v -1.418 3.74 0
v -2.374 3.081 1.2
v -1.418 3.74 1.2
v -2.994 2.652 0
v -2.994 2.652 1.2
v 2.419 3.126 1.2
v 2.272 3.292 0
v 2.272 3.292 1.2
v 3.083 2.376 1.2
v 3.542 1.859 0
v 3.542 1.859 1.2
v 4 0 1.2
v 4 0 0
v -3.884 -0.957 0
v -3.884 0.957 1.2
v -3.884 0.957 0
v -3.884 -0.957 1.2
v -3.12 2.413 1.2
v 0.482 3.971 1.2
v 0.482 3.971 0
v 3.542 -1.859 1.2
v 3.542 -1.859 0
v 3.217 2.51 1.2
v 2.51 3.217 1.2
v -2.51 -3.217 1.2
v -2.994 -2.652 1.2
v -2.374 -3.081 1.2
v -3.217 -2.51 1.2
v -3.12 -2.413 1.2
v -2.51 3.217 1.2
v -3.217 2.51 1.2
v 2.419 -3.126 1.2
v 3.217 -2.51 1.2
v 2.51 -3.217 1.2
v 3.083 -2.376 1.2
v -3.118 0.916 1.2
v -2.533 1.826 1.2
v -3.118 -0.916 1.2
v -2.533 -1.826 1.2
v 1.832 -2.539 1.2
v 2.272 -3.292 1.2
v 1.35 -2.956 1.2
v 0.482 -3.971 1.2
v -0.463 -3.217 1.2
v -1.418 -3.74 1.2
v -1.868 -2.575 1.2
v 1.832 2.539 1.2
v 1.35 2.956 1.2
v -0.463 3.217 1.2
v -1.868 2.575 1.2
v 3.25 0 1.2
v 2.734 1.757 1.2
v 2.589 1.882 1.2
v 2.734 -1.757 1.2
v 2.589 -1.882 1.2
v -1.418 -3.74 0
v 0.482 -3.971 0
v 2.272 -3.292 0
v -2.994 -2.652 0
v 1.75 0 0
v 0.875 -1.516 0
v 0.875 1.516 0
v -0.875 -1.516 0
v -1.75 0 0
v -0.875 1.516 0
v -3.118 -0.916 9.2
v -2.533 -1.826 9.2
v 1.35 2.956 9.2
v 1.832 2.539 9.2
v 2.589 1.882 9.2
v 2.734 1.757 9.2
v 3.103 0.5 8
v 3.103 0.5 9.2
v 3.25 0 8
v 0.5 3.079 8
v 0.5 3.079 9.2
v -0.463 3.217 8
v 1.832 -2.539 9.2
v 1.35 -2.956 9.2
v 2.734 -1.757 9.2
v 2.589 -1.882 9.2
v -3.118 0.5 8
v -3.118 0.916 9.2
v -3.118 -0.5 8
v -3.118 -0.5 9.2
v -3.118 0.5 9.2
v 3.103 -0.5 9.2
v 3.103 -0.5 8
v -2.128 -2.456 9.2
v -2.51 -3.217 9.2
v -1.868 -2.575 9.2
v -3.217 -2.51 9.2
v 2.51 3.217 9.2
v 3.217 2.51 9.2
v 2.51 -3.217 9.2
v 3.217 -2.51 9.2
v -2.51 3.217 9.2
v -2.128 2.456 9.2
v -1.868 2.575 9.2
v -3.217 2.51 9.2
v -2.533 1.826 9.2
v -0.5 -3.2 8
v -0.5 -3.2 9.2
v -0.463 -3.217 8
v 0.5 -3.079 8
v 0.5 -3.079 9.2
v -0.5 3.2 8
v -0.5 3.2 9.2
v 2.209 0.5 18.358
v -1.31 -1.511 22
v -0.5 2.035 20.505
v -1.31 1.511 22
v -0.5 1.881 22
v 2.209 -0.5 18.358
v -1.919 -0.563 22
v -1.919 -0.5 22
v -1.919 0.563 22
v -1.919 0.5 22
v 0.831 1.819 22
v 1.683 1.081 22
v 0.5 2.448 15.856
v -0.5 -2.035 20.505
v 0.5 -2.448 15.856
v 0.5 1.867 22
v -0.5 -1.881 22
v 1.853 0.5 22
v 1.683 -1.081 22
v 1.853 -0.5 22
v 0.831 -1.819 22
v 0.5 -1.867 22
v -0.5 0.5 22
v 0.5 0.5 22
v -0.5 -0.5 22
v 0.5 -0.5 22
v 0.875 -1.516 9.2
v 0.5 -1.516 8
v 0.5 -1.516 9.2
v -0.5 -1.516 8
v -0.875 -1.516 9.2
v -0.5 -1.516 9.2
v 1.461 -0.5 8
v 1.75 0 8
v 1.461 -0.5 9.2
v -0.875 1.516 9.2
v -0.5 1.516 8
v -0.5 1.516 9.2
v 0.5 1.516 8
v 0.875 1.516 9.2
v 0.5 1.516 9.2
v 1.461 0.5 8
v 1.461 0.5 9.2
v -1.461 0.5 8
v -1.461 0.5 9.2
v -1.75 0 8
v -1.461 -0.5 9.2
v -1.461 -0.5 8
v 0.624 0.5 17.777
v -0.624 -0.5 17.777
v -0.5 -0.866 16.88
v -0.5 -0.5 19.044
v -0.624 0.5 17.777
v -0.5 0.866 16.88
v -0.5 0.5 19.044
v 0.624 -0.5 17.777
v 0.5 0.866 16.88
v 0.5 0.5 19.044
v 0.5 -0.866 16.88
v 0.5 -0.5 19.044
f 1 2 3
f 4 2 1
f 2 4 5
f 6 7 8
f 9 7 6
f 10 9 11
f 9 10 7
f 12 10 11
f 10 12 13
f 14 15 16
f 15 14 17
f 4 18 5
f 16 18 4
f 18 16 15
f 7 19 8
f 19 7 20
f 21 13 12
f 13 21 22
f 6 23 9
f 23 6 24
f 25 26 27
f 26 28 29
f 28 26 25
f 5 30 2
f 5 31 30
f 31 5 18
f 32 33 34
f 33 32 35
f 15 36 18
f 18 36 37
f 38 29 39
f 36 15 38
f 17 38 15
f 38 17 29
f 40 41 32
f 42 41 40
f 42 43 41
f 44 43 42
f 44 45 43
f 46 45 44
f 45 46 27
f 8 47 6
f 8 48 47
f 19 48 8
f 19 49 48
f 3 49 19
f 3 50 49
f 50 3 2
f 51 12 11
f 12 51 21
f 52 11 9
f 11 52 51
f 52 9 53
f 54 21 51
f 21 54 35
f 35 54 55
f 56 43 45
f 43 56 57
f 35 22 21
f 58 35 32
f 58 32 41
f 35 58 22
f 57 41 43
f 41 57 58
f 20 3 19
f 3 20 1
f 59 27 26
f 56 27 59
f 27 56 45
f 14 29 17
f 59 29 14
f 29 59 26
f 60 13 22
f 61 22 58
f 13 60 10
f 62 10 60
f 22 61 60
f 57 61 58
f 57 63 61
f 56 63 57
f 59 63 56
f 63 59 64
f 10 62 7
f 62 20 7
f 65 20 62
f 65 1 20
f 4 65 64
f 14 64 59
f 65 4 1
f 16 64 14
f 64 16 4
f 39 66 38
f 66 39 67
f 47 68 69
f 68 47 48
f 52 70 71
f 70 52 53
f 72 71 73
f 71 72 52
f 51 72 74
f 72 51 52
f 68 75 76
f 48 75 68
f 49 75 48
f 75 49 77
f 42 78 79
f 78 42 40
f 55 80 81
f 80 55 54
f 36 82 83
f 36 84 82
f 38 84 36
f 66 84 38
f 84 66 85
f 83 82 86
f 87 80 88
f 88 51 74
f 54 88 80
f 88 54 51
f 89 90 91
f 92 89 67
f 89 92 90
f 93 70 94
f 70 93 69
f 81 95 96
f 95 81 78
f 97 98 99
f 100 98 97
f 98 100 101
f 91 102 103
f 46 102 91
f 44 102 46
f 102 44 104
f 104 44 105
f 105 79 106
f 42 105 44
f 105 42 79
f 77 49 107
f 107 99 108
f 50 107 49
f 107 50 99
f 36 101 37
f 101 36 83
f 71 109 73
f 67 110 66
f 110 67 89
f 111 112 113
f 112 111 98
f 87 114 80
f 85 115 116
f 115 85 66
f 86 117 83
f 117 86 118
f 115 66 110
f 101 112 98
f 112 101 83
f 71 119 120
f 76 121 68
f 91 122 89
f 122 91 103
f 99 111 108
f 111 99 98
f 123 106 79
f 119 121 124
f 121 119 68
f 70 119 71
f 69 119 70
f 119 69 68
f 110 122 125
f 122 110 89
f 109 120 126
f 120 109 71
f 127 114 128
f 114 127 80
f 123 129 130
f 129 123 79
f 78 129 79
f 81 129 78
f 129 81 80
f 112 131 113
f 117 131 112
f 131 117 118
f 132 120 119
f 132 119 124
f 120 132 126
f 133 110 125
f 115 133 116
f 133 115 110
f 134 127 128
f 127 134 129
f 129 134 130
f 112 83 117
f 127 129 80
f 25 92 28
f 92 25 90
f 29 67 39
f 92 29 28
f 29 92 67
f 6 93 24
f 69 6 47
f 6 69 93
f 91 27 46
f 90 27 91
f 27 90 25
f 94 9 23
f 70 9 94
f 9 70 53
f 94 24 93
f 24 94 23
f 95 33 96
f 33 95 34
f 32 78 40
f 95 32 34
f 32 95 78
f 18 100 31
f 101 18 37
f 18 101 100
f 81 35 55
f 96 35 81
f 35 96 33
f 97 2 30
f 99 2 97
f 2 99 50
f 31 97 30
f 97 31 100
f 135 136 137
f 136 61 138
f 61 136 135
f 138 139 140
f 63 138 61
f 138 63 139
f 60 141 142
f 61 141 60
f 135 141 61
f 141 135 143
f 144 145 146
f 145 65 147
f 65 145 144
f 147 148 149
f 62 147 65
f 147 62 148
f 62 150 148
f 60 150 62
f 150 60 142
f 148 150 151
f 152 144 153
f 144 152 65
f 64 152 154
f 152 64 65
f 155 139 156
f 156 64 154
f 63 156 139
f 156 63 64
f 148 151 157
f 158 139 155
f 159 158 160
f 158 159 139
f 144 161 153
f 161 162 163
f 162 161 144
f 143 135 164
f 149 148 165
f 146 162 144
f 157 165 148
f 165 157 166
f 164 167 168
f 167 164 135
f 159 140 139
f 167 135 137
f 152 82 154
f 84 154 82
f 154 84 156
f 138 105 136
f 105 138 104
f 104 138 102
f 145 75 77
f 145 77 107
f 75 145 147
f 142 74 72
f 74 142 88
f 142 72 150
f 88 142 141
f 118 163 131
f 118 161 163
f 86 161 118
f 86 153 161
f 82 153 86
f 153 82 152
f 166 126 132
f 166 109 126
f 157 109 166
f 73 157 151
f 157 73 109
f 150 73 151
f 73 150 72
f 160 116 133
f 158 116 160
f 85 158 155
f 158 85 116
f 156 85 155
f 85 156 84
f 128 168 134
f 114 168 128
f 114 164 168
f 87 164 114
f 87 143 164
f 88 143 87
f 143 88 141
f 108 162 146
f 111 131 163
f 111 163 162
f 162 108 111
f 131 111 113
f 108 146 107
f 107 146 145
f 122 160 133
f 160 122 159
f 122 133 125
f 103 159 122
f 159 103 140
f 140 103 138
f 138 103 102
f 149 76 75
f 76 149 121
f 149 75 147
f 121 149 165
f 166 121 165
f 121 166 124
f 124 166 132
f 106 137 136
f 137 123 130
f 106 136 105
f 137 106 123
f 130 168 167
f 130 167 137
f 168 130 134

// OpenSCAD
anchor_length=22;	// total length of the wall anchor


screw_major_diameter=3.5;	// diameter of shoulder of screw (#6 is 3.33 mm)
screw_minor_diameter=1;

straight_section_length=8;	// length of anchor before taper and cuts start

flange_diameter=8;  		// diameter of flange outside of anchor
flange_thickness=1.2;
anchor_wall_thickness=1.5;	// how much material there is in the wall of the anchor

cutout_width=1;
cutout_length=14;
cutout_offset=0;			// distance of cutout from end of anchor

rib_width=1;
rib_length=straight_section_length;
rib_stickout=0.8;

difference() {
	union() {
		cylinder(r=flange_diameter/2, h=flange_thickness);
		cylinder(r=screw_major_diameter/2+anchor_wall_thickness, h=straight_section_length+flange_thickness);
		translate([0,0,straight_section_length+flange_thickness]) cylinder(r1=screw_major_diameter/2+anchor_wall_thickness, r2=screw_minor_diameter/2+anchor_wall_thickness, h=anchor_length-straight_section_length-flange_thickness);
		rotate(v=[0,0,1],a=45) translate([0,0,flange_thickness+rib_length/2]) cube([screw_major_diameter+2*anchor_wall_thickness+rib_stickout*2,rib_width,rib_length],center=true);
		rotate(v=[0,0,1],a=135) translate([0,0,flange_thickness+rib_length/2]) cube([screw_major_diameter+2*anchor_wall_thickness+rib_stickout*2,rib_width,rib_length],center=true);
	}
	
	union() {
		cylinder(r=screw_major_diameter/2, h=straight_section_length+flange_thickness);
		translate([0,0,straight_section_length+flange_thickness]) cylinder(r1=screw_major_diameter/2, r2=screw_minor_diameter/2, h=anchor_length-straight_section_length-flange_thickness);
		translate([0,0,cutout_length/2+anchor_length-cutout_length-cutout_offset]) cube([screw_major_diameter+2*anchor_wall_thickness,cutout_width,cutout_length],center=true);
		rotate(v=[0,0,1],a=90) translate([0,0,cutout_length/2+anchor_length-cutout_length-cutout_offset]) cube([screw_major_diameter+2*anchor_wall_thickness,cutout_width,cutout_length],center=true);
	}
}
